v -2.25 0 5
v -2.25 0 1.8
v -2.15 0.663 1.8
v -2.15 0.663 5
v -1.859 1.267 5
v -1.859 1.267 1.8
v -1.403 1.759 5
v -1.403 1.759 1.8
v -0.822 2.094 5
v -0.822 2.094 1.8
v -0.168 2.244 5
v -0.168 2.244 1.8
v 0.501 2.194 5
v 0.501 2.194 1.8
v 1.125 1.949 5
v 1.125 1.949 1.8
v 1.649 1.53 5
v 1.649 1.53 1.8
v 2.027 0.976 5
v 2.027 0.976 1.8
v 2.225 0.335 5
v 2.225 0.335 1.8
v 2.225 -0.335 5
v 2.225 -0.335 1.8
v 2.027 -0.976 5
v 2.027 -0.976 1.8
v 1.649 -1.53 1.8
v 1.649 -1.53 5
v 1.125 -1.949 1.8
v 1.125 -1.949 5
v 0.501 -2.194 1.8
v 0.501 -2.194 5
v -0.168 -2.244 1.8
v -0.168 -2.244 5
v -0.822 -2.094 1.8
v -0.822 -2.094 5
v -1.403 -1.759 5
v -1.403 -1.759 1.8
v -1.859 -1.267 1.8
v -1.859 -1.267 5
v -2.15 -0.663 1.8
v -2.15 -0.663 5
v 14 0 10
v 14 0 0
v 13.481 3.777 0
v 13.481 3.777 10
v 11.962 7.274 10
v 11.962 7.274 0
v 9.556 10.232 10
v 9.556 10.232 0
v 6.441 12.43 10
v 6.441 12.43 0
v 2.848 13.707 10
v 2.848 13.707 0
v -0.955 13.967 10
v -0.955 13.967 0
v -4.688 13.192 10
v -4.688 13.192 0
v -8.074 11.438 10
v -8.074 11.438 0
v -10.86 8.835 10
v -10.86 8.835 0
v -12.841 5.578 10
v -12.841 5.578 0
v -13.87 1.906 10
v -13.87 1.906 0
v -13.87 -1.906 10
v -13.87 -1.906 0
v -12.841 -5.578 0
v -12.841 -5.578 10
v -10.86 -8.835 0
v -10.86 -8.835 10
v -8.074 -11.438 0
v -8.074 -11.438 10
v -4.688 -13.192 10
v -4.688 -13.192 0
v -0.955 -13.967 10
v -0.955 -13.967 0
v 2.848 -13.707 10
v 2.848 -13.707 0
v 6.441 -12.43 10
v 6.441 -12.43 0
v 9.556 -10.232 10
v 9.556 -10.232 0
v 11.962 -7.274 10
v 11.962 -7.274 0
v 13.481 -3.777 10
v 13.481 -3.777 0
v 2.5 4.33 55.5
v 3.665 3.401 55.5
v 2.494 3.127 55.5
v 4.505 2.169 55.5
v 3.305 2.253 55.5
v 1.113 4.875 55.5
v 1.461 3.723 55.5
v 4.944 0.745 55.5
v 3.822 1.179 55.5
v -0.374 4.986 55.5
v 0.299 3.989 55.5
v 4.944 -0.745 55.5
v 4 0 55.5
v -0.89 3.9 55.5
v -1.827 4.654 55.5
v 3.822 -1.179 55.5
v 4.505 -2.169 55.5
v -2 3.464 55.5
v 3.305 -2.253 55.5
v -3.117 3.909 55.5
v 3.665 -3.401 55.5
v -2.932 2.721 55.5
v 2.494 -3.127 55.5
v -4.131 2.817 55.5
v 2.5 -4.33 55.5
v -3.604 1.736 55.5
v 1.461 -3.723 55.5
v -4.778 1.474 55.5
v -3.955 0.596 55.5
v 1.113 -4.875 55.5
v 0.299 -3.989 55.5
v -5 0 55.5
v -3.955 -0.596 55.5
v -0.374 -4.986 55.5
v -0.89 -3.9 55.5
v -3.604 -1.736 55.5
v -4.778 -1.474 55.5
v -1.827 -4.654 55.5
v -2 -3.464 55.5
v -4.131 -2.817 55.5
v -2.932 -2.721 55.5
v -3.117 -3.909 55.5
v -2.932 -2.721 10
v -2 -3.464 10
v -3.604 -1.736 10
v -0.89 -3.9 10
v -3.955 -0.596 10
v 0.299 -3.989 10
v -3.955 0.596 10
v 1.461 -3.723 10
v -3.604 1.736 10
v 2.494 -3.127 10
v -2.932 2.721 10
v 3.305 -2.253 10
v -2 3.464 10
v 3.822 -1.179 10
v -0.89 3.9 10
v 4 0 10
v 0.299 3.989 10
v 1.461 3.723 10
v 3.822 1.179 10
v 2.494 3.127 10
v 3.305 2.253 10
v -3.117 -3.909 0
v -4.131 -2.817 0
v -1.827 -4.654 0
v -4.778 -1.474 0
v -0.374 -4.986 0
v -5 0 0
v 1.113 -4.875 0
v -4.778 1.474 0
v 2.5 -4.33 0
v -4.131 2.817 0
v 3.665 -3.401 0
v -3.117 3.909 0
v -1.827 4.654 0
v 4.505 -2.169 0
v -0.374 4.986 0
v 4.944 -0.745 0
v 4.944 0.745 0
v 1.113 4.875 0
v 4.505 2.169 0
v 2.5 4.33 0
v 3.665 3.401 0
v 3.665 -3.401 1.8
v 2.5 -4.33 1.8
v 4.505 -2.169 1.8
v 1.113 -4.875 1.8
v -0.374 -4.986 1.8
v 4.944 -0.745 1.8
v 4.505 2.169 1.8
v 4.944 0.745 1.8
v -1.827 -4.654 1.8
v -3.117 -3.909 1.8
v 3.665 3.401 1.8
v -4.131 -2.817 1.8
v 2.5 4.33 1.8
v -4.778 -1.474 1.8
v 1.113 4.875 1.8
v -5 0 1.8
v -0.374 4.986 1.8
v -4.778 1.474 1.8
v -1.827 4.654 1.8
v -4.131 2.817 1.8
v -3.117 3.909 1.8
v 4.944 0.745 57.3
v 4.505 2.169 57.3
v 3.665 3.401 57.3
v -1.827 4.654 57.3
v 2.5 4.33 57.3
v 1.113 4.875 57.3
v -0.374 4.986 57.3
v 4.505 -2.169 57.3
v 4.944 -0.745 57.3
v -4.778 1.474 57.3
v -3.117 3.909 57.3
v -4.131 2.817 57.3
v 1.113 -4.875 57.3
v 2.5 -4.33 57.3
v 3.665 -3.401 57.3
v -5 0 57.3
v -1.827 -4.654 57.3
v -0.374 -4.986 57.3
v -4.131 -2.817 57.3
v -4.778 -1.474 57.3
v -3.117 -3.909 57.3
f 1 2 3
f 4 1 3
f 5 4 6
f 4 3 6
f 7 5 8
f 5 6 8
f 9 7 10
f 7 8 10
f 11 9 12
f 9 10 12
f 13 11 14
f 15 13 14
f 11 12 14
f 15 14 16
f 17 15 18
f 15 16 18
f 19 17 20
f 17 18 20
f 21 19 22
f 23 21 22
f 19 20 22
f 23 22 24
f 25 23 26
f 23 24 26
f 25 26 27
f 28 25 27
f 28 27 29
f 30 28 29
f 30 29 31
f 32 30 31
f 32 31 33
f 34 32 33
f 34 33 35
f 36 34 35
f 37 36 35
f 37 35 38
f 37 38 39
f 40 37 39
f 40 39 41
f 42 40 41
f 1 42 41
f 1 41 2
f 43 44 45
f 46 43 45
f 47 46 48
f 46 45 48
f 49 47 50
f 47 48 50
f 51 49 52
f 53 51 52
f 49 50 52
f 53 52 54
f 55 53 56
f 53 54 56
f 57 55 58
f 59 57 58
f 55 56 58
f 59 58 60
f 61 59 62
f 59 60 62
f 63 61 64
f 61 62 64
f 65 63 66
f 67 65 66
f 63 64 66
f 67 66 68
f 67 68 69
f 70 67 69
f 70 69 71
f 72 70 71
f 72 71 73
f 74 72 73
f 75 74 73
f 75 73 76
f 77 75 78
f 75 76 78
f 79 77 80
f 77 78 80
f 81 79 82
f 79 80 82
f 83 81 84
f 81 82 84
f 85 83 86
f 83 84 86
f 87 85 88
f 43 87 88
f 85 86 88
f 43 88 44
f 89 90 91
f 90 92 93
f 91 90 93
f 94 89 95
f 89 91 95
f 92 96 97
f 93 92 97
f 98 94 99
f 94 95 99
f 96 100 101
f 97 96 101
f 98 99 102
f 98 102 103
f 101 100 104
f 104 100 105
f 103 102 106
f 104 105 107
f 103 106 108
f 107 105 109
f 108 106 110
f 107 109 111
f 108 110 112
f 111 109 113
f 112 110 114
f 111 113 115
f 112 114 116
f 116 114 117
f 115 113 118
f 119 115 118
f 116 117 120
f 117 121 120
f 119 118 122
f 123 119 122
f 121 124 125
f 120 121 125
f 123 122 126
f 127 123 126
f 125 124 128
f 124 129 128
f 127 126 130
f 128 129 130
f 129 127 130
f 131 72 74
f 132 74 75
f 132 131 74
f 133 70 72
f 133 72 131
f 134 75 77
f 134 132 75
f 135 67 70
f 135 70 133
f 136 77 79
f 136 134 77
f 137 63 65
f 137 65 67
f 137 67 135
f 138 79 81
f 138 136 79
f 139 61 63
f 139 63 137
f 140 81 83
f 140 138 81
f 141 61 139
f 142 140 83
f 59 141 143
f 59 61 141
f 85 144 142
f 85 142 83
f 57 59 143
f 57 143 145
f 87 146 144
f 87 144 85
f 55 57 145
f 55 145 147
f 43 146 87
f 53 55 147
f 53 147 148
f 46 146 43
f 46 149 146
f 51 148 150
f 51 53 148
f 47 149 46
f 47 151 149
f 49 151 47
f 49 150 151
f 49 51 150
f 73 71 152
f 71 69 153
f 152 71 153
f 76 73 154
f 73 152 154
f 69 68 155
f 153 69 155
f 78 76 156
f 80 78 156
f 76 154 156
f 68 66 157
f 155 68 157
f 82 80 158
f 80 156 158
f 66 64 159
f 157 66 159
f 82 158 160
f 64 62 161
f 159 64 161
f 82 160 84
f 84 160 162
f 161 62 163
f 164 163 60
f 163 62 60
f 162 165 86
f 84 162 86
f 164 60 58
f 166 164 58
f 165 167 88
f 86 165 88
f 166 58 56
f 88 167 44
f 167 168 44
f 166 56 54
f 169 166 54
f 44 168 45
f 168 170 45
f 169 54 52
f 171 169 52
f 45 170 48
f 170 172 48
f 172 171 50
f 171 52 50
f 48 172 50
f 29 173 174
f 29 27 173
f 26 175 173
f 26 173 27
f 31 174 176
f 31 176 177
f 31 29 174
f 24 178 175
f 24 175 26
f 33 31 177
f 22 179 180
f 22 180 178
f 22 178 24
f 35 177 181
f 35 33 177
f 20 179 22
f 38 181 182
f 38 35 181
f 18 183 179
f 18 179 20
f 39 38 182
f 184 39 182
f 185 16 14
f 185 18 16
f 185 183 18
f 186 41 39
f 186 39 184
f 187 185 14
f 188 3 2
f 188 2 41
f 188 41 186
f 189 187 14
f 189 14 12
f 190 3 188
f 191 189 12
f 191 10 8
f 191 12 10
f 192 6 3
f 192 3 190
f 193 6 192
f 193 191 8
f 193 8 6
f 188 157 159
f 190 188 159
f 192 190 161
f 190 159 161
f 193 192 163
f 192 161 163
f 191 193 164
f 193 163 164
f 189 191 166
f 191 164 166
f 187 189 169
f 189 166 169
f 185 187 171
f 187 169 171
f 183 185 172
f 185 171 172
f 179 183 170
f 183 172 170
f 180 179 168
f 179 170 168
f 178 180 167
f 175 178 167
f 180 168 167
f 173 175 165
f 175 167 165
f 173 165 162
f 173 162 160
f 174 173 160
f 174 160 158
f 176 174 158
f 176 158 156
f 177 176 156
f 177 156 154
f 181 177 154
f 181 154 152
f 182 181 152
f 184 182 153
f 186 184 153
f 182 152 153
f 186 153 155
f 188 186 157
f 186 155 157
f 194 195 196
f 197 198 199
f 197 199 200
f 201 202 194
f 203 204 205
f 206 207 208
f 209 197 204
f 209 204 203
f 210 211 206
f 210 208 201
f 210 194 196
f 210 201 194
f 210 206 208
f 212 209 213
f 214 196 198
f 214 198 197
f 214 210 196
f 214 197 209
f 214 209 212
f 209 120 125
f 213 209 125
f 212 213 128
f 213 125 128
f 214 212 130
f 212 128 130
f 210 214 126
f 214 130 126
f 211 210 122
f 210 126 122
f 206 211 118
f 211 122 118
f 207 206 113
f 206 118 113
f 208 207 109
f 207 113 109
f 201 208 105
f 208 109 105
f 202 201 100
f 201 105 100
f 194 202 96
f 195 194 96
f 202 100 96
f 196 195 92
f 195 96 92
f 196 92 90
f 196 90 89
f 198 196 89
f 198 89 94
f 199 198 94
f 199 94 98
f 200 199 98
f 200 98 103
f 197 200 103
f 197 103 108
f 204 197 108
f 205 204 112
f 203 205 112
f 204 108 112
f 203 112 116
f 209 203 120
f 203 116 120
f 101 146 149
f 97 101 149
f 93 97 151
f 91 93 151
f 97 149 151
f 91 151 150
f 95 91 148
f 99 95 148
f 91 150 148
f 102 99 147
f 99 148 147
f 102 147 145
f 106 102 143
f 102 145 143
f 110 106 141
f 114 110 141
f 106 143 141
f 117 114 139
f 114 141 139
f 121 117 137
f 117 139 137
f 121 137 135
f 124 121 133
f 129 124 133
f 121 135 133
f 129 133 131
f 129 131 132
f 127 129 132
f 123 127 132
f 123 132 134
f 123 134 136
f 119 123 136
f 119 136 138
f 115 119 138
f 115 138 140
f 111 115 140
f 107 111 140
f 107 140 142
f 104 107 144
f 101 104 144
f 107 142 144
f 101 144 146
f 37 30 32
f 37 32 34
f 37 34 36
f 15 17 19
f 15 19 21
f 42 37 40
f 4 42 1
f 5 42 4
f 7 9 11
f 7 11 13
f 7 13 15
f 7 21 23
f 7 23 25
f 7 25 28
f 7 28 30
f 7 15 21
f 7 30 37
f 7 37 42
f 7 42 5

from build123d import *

# Parameters (mm, degrees)
SKETCH1_R                = 14
BOSS_EXTRUDE1_DEPTH      = 10
SKETCH2_R                = 2.25
CUT_EXTRUDE1_DEPTH       = 5
SKETCH3_R                = 5
CUT_EXTRUDE2_DEPTH       = 1.8
SKETCH11_R               = 4
BOSS_EXTRUDE2_DEPTH      = 45.5
ESBO_O2_R                = 5
RESSALTO_EXTRUS_O1_DEPTH = 1.8


with BuildPart() as part:
    # Sketch1 → Boss-Extrude1 (new body)
    with BuildSketch(Plane.XY):
        Circle(SKETCH1_R)
    extrude(amount=BOSS_EXTRUDE1_DEPTH)

    # Sketch2 → Cut-Extrude1 (cut)
    with BuildSketch(Plane(origin=(0, 0, 0), x_dir=(-1, 0, 0), z_dir=(0, 0, -1))):
        Circle(SKETCH2_R)
    extrude(amount=-CUT_EXTRUDE1_DEPTH, mode=Mode.SUBTRACT)

    # Sketch3 → Cut-Extrude2 (cut)
    with BuildSketch(Plane(origin=(0, 0, 0), x_dir=(-1, 0, 0), z_dir=(0, 0, -1))):
        Circle(SKETCH3_R)
    extrude(amount=-CUT_EXTRUDE2_DEPTH, mode=Mode.SUBTRACT)

    # Sketch11 → Boss-Extrude2 (add)
    with BuildSketch(Plane.XY.offset(10)):
        Circle(SKETCH11_R)
    extrude(amount=BOSS_EXTRUDE2_DEPTH)

    # Esboço2 → Ressalto-extrusão1 (add)
    with BuildSketch(Plane.XY.offset(55.5)):
        with Locations(Location((0, 0, 0), (0, 0, 180))):
            Circle(ESBO_O2_R)
    extrude(amount=RESSALTO_EXTRUS_O1_DEPTH)


solid = part.part
